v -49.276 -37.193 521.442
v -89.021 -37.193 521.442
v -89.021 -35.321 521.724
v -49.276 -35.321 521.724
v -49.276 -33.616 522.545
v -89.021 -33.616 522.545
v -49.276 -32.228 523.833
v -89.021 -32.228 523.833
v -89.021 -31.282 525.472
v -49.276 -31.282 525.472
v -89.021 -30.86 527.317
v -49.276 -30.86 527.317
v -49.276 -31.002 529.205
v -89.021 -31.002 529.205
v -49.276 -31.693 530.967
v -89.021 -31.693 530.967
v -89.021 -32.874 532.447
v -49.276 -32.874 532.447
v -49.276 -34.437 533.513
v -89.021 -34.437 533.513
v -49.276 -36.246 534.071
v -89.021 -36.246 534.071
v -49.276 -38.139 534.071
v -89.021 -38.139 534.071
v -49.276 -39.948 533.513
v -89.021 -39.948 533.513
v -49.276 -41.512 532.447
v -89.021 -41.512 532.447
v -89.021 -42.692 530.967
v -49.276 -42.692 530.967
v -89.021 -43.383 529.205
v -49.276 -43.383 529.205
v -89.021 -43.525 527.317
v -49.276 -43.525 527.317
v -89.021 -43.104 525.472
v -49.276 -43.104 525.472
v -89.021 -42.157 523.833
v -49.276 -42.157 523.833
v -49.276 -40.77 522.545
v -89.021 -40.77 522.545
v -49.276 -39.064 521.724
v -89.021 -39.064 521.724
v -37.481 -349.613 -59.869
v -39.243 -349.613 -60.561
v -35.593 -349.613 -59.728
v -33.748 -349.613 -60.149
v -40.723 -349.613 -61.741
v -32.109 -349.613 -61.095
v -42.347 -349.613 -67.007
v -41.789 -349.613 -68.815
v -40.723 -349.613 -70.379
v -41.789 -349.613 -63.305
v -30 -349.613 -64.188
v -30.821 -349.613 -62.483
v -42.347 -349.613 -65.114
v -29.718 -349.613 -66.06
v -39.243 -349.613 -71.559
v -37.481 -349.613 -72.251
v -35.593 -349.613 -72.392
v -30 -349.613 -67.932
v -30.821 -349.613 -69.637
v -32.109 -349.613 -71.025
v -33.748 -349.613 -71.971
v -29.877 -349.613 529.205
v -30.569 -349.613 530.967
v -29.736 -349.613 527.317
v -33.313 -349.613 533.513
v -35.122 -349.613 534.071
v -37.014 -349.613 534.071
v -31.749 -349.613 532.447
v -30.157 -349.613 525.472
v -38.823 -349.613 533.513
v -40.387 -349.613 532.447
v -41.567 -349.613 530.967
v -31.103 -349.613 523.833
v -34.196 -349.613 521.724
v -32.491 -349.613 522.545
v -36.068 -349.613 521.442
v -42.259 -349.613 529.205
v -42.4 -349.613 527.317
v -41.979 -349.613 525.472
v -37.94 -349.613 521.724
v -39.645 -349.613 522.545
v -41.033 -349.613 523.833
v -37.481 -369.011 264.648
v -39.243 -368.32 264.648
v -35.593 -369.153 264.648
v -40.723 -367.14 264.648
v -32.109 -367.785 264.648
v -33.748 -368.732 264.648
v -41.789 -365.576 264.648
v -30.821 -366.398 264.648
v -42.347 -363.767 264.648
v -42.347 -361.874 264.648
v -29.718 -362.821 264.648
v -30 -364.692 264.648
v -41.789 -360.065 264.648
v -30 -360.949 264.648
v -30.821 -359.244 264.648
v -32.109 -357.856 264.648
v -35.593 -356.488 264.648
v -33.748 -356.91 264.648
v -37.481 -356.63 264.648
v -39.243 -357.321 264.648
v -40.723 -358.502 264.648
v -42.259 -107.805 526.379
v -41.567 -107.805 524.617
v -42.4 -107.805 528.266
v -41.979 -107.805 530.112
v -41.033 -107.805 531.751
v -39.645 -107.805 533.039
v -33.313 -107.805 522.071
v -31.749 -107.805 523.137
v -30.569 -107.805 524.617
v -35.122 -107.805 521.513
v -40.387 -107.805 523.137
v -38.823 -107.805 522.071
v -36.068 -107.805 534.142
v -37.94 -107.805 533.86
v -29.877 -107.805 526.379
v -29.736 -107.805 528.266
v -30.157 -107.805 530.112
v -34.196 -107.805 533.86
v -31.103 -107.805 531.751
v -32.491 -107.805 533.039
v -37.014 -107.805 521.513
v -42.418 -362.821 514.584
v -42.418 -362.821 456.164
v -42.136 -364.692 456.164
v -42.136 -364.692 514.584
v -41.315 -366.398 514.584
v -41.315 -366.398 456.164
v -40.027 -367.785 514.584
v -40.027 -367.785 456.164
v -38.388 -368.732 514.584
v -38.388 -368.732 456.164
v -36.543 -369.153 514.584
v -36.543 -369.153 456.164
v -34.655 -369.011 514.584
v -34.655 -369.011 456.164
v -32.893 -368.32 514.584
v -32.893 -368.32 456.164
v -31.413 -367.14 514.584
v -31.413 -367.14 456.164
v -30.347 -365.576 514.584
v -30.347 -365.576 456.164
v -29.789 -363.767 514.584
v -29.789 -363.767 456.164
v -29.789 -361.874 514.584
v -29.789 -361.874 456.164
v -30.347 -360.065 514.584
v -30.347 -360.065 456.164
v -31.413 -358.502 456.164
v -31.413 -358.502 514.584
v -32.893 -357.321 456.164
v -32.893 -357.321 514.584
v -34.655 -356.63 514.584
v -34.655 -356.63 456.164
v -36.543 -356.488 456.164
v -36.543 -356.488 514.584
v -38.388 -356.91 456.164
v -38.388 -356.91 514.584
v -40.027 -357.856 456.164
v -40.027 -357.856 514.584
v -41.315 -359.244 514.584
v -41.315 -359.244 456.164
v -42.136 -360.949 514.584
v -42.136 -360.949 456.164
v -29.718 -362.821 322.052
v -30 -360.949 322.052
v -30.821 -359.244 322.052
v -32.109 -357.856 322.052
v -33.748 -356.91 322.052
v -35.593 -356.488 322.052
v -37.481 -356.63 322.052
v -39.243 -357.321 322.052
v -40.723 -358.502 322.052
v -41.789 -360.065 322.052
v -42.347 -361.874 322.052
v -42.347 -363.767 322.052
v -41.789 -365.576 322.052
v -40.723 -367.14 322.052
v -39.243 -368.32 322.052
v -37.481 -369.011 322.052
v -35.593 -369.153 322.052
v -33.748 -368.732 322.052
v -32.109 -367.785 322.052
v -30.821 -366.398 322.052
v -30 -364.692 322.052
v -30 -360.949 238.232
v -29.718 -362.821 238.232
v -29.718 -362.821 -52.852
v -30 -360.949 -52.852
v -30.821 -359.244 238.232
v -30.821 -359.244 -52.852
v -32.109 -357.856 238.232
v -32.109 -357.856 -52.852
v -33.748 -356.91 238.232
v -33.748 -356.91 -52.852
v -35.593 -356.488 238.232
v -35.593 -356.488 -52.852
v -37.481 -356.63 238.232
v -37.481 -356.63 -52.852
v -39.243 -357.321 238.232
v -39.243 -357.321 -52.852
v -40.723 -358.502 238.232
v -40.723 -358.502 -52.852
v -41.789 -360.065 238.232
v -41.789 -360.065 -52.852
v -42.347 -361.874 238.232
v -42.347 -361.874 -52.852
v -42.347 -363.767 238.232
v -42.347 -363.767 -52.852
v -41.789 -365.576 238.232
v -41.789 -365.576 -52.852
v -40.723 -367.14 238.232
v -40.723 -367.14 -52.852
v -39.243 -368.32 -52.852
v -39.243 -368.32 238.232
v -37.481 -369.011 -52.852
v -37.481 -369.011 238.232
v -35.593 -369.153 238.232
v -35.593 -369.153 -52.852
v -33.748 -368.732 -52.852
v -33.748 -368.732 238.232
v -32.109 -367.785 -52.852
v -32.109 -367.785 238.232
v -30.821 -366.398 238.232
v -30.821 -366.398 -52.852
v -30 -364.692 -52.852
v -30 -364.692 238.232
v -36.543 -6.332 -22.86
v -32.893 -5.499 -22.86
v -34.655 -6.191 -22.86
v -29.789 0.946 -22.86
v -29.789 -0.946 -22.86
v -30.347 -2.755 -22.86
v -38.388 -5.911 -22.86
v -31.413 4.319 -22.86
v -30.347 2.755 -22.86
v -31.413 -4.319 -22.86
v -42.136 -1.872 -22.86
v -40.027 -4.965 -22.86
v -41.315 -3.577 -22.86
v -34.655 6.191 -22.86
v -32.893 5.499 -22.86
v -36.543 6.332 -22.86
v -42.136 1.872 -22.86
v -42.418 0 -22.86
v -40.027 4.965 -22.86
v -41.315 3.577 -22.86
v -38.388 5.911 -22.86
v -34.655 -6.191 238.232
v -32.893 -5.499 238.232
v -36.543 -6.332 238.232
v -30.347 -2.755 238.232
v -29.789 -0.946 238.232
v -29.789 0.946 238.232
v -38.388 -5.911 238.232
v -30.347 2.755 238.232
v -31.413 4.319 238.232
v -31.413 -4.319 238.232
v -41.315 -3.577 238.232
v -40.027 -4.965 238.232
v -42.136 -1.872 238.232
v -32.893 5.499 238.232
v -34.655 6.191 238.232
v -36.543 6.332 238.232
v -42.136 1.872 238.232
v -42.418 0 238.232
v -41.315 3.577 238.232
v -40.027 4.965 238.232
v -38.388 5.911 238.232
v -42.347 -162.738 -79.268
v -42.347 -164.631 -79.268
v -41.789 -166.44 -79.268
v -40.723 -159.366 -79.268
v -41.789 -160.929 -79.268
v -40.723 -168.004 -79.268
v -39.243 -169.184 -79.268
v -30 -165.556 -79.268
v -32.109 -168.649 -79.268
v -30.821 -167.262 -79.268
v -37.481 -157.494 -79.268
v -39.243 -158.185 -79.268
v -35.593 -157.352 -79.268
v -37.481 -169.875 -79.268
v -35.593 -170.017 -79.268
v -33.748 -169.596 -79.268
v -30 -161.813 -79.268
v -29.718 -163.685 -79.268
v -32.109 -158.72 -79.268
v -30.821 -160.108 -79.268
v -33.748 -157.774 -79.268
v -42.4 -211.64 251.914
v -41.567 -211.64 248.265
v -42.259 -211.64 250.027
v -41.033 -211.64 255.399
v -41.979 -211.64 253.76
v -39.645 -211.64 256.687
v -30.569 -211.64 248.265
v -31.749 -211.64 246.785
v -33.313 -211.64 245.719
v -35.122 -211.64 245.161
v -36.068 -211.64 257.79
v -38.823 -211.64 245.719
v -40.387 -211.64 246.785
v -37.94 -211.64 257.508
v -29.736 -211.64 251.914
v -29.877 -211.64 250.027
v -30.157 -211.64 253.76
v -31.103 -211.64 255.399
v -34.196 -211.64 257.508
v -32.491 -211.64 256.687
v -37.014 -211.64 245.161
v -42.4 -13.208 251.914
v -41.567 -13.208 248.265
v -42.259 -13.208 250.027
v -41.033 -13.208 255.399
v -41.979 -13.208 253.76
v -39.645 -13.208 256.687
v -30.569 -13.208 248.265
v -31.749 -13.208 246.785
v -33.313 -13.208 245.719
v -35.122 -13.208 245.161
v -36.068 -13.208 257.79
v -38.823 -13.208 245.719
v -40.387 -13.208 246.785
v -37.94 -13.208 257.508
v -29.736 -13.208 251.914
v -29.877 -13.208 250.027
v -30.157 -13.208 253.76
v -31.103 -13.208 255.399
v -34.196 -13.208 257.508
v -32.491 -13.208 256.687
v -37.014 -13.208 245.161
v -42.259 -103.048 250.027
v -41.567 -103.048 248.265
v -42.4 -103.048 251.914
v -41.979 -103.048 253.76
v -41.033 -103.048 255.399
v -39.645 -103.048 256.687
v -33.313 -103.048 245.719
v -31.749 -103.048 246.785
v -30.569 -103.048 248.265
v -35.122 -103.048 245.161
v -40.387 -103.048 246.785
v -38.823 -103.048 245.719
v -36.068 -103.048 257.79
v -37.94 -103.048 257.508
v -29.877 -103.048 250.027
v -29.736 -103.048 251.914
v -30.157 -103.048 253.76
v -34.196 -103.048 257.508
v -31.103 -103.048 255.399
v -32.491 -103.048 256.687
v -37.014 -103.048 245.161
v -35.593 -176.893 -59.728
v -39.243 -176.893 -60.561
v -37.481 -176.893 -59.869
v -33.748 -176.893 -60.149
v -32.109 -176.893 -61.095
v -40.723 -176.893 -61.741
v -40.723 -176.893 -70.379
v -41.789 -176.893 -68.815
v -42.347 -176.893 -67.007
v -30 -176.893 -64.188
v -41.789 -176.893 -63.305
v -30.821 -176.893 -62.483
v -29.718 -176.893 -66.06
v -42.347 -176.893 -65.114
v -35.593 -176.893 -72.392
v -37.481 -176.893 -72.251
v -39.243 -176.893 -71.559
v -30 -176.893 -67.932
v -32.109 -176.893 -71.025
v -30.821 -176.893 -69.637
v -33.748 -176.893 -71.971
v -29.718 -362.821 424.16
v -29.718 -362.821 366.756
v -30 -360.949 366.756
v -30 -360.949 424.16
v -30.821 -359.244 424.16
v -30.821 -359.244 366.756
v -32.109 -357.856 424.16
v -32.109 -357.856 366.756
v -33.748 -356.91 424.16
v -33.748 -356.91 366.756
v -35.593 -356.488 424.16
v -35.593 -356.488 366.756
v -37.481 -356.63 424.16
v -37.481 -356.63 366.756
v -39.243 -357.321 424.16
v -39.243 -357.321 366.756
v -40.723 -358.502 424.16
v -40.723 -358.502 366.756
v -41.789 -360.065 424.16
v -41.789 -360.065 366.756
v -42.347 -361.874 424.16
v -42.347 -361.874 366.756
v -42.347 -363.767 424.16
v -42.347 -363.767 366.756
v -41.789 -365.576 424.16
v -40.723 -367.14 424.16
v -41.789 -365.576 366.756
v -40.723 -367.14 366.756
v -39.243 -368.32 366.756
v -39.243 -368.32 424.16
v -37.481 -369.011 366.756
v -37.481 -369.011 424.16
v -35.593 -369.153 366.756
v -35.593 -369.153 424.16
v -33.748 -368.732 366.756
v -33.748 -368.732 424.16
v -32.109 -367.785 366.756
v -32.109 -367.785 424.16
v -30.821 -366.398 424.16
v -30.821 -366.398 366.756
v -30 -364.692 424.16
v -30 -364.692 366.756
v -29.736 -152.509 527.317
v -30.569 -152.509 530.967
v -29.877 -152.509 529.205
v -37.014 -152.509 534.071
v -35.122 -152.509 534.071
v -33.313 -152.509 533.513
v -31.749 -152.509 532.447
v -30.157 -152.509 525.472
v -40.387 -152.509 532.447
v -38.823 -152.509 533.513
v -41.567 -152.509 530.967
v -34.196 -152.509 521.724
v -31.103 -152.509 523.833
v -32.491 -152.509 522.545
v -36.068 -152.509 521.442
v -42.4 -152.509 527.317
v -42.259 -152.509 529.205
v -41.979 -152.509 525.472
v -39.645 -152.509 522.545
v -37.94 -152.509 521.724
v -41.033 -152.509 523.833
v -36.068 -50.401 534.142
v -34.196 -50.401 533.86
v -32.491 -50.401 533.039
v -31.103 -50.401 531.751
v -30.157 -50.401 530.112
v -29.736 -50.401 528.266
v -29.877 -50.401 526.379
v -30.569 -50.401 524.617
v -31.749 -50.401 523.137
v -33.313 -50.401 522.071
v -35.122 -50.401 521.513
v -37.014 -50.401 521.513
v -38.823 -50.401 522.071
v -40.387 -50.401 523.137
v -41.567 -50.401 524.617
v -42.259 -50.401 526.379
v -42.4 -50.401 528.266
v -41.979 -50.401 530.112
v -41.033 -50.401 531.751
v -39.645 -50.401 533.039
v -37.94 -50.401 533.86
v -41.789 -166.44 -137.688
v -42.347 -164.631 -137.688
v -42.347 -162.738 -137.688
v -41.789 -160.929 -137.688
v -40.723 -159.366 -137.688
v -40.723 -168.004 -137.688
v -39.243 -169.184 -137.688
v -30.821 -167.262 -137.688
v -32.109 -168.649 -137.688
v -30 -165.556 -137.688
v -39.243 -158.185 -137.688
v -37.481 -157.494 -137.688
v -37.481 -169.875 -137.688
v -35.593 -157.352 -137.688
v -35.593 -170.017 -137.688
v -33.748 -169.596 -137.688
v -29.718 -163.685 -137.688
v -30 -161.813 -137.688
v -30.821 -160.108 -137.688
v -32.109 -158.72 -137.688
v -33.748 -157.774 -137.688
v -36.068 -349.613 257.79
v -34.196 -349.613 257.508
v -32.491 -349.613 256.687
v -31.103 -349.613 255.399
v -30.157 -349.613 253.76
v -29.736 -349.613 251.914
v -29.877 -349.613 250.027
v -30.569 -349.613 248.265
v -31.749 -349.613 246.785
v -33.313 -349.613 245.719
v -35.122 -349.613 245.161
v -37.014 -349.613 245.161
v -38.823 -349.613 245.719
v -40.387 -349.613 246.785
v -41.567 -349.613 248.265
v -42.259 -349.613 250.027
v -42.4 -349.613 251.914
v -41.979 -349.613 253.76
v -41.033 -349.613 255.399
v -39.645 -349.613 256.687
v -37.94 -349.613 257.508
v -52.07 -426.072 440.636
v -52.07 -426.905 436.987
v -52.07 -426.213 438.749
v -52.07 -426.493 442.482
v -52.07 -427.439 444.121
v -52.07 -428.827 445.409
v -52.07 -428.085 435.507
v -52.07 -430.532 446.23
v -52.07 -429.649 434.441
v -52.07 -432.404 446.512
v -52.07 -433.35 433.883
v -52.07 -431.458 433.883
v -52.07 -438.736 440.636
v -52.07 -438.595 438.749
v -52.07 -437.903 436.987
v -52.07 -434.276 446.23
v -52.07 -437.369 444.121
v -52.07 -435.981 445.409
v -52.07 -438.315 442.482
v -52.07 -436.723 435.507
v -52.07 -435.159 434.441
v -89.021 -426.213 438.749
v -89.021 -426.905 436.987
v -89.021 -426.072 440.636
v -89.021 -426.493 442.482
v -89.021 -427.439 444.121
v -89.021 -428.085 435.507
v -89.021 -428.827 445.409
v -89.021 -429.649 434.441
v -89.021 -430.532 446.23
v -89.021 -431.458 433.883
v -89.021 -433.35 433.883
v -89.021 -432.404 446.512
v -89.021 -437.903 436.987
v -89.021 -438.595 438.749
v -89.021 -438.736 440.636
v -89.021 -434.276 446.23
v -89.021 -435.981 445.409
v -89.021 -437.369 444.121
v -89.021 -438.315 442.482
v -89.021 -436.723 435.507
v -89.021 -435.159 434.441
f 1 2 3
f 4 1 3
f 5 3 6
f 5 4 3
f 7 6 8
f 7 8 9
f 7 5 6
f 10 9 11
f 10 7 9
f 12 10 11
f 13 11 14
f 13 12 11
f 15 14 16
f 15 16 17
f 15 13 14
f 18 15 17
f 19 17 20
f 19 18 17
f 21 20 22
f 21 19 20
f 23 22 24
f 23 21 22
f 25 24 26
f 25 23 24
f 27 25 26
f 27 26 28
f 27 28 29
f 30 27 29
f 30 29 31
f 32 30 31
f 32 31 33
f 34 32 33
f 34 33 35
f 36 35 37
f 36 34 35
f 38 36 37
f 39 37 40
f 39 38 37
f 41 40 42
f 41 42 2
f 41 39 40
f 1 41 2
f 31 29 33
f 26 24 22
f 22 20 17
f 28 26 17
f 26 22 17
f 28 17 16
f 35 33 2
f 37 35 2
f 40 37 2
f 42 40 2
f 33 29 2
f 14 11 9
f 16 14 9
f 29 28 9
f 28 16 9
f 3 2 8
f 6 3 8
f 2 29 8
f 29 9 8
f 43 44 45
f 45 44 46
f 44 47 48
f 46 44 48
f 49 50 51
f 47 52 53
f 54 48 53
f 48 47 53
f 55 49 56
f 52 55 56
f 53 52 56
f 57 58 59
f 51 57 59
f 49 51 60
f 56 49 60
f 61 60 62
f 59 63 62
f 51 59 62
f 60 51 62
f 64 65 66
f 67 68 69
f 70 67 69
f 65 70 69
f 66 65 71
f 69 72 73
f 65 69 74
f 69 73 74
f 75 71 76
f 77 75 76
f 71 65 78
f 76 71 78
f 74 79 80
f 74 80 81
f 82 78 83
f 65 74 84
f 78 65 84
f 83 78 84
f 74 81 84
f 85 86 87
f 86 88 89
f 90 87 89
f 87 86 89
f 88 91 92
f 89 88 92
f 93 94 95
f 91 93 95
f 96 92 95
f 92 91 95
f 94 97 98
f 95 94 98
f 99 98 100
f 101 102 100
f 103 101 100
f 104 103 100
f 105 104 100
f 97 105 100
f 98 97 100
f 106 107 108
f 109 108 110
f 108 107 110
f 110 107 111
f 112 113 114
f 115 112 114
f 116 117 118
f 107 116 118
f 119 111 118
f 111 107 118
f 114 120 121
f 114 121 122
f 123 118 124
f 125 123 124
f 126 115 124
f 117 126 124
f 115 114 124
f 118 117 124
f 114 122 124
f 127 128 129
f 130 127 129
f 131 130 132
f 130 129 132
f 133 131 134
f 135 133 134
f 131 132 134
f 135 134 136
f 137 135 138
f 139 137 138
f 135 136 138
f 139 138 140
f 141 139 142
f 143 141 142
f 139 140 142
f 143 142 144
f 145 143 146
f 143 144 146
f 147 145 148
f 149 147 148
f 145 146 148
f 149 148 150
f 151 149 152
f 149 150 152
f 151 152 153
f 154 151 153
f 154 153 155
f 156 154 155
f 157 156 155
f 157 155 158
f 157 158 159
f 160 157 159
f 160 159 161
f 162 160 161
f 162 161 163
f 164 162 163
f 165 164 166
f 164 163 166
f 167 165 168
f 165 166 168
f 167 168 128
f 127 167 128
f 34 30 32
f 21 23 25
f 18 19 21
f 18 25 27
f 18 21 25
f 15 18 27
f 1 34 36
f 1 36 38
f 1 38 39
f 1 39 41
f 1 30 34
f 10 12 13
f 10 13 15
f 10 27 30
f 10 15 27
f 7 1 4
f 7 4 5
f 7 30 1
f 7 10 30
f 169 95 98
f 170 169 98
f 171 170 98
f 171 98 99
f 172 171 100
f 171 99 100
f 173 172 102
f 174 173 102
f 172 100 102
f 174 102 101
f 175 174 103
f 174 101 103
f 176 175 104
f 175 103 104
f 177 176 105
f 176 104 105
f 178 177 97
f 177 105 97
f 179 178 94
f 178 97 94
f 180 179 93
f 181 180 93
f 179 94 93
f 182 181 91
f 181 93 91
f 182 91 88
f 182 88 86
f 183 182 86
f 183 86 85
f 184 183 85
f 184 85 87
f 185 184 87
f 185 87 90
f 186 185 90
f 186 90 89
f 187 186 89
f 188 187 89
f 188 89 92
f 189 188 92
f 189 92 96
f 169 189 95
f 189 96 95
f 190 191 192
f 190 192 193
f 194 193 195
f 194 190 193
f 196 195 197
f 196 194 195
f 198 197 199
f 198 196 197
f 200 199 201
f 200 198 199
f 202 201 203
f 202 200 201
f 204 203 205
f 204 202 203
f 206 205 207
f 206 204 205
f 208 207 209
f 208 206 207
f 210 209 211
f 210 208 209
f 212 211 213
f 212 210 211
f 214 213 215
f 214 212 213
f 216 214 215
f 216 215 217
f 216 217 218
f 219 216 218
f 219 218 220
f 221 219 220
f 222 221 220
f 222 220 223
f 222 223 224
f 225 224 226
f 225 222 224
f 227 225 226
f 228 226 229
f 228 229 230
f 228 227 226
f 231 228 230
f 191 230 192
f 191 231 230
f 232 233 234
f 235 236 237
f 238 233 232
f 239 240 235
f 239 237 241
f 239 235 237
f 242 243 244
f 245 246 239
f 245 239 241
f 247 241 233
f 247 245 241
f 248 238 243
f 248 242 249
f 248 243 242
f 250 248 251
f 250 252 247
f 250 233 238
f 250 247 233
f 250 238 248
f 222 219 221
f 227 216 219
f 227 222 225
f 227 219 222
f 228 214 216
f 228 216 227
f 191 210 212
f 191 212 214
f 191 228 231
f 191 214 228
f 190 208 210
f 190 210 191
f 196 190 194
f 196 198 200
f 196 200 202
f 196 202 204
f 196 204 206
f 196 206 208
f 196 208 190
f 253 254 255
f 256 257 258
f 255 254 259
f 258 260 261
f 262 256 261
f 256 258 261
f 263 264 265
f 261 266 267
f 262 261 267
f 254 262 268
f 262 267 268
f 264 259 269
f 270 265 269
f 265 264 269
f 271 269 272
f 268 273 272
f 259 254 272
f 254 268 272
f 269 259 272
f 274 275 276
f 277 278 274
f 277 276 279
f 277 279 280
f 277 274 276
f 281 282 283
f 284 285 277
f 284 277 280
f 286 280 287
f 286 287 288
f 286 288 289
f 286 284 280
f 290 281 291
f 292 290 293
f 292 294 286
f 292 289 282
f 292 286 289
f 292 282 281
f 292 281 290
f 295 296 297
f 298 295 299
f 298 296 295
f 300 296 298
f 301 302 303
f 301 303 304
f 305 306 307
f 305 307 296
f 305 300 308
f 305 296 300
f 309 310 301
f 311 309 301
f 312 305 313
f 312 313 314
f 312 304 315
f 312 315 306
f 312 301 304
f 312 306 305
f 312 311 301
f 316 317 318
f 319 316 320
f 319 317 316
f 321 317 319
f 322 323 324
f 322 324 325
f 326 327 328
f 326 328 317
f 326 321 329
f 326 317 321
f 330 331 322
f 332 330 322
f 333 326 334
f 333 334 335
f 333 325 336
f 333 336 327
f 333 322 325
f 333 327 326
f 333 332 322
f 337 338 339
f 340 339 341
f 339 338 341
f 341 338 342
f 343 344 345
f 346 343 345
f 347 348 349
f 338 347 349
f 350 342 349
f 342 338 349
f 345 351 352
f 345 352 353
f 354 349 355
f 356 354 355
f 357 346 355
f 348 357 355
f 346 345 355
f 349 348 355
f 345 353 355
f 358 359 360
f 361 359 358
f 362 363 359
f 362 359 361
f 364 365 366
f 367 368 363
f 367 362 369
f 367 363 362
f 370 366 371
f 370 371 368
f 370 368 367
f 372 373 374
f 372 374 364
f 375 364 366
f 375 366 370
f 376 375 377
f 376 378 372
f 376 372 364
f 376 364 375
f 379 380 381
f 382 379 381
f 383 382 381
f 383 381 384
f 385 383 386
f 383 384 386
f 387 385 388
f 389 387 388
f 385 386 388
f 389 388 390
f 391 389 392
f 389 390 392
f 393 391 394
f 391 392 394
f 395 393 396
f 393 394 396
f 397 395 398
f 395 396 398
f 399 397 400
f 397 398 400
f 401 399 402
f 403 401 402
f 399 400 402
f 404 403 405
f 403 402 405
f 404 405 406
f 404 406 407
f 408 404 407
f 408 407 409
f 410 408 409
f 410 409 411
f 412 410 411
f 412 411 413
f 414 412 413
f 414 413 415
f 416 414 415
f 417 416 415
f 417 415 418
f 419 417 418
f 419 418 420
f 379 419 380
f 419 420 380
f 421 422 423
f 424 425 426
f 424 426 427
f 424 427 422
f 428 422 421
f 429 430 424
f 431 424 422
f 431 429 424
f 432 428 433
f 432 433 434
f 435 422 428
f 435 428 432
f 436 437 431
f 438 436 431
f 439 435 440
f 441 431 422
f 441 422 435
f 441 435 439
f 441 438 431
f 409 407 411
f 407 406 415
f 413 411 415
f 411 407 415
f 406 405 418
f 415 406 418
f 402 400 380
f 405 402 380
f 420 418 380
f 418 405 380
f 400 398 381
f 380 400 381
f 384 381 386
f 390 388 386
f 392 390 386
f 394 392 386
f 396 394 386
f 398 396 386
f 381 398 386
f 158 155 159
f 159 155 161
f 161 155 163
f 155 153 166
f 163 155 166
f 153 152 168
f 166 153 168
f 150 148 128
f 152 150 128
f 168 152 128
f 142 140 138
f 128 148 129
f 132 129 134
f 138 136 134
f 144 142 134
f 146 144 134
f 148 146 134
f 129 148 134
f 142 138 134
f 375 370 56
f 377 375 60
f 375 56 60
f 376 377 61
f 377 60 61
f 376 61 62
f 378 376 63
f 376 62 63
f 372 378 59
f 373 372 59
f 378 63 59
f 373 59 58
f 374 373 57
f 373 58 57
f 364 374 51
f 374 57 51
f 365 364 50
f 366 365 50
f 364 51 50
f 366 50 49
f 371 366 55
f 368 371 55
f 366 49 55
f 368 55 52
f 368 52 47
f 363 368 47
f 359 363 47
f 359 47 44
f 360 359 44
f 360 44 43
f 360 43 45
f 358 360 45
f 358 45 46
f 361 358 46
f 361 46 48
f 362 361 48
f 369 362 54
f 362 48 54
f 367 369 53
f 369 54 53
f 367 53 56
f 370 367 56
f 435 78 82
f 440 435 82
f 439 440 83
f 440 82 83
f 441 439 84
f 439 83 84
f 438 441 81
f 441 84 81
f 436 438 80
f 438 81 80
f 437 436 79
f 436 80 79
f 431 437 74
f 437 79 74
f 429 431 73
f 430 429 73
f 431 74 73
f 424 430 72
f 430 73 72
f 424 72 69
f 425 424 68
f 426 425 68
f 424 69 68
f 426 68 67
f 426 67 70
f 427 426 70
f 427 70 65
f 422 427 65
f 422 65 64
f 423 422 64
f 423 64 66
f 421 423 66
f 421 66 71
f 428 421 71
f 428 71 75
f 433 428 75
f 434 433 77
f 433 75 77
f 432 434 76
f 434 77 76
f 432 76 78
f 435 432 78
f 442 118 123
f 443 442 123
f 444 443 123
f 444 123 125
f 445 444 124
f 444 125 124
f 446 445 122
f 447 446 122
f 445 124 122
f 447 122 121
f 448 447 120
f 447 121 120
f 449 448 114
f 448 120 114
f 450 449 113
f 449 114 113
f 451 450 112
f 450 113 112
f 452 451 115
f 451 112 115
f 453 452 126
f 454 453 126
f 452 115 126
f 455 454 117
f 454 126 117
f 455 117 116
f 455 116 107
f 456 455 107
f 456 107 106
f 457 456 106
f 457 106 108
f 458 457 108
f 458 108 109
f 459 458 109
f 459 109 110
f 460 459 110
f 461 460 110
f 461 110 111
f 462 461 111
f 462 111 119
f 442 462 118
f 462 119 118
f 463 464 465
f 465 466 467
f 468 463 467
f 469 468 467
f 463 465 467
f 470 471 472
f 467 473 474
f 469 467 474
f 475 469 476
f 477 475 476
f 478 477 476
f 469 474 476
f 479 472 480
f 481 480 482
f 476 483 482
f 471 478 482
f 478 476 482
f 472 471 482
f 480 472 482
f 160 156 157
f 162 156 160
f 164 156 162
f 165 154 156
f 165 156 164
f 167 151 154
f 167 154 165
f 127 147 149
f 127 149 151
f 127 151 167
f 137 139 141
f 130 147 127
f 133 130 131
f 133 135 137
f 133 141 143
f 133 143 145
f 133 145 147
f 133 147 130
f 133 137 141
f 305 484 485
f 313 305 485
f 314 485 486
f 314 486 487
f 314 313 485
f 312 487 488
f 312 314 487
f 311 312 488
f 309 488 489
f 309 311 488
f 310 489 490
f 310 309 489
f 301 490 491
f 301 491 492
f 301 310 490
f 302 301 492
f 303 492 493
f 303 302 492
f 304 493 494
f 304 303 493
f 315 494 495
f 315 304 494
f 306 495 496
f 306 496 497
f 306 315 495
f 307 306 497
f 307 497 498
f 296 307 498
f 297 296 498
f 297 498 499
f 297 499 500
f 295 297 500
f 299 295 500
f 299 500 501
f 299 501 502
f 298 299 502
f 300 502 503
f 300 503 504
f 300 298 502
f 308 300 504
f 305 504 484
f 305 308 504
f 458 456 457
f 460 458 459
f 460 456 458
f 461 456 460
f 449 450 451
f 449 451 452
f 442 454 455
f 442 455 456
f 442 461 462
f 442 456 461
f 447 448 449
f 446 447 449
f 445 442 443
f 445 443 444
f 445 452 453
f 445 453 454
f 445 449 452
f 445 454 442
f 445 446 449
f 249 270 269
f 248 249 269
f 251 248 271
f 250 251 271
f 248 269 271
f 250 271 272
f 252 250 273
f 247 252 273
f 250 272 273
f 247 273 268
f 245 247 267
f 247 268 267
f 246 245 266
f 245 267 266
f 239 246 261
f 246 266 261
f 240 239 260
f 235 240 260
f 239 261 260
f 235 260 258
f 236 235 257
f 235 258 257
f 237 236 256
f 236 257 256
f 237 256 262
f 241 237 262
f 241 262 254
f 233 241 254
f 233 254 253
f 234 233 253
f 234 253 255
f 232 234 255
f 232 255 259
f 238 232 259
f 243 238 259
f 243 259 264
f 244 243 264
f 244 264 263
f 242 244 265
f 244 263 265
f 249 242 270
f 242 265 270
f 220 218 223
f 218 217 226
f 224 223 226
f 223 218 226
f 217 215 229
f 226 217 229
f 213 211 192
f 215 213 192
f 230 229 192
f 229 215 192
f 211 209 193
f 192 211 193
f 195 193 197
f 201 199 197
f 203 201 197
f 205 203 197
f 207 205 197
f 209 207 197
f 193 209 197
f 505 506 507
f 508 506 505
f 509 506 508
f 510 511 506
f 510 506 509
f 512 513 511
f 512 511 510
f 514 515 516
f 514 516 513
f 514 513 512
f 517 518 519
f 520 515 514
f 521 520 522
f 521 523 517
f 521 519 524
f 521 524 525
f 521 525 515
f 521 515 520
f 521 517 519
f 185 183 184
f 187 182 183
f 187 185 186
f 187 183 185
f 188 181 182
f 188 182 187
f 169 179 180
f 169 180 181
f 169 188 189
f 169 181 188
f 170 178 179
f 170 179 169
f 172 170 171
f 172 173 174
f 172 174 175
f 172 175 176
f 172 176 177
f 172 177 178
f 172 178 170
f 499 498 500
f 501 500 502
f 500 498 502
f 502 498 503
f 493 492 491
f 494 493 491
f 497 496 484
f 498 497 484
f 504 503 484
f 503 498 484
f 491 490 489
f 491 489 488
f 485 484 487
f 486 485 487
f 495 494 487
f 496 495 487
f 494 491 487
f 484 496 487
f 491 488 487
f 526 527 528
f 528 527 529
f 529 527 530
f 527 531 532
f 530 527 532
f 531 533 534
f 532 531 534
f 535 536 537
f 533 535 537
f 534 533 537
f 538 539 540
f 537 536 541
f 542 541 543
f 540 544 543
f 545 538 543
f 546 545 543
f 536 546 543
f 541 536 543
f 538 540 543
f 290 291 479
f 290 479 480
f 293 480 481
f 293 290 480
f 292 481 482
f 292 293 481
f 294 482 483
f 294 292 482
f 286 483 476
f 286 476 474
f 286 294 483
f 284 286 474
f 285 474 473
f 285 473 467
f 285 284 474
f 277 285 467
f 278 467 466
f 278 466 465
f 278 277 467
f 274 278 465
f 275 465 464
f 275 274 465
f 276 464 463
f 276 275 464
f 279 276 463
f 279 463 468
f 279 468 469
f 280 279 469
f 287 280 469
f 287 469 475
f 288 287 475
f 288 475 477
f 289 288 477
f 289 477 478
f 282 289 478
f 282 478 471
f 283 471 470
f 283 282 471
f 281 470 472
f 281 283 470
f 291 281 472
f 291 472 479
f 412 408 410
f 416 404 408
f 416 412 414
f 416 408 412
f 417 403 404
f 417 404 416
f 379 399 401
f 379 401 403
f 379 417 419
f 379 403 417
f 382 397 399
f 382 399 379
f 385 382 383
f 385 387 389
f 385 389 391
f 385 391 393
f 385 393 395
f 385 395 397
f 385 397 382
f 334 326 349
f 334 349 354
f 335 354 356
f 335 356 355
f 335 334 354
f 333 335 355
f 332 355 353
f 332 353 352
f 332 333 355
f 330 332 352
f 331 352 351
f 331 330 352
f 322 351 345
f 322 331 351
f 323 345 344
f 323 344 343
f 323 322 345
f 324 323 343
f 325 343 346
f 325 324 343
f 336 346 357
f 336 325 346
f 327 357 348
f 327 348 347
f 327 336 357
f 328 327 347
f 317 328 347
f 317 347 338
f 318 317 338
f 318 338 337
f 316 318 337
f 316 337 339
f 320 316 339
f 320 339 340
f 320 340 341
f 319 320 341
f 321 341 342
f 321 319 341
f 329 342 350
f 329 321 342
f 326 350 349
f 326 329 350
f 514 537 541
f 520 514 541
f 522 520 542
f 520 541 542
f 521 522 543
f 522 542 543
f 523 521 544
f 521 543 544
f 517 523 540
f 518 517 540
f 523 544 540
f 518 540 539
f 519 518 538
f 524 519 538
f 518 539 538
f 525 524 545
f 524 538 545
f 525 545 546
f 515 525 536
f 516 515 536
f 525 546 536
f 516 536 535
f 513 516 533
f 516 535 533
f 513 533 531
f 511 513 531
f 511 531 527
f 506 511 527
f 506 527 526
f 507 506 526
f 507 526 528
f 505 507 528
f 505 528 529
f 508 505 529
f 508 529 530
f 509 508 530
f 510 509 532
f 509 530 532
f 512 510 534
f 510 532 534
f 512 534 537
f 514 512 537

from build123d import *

# Parameters (mm, degrees)
BOSS_EXTRUDE1_START     = -261.091901869
BOSS_EXTRUDE1_OUTLINE_R = 6.35
BOSS_EXTRUDE1_DEPTH     = 261.091901869
SKETCH3_R               = 6.35
BOSS_EXTRUDE2_DEPTH     = 89.839846195
SKETCH4_R               = 6.35
BOSS_EXTRUDE3_DEPTH     = 137.9728
SKETCH5_R               = 6.35
BOSS_EXTRUDE4_DEPTH     = 291.084
SKETCH6_R               = 6.35
BOSS_EXTRUDE5_DEPTH     = 172.720000001
SKETCH7_R               = 6.35
BOSS_EXTRUDE6_DEPTH     = 58.42
SKETCH8_R               = 6.35
BOSS_EXTRUDE7_DEPTH     = 57.404
SKETCH9_R               = 6.35
BOSS_EXTRUDE8_DEPTH     = 57.404
SKETCH10_R              = 6.35
BOSS_EXTRUDE9_DEPTH     = 36.950997131
SKETCH11_R              = 6.35
BOSS_EXTRUDE10_DEPTH    = 58.42
SKETCH12_R              = 6.35
BOSS_EXTRUDE11_DEPTH    = 197.104
SKETCH13_R              = 6.35
BOSS_EXTRUDE12_DEPTH    = 57.404
SKETCH14_R              = 6.35
BOSS_EXTRUDE13_DEPTH    = 39.744997131


# Read off the part's stored shape, not the designer's step: Boss-Extrude1
with BuildPart() as part:
    # Boss-Extrude1 outline → Boss-Extrude1 (new body)
    with BuildSketch(Plane(origin=(0, 0, -22.86), x_dir=(-1, 0, 0), z_dir=(0, 0, -1)).offset(BOSS_EXTRUDE1_START)):
        with Locations((36.068, 0)):
            Circle(BOSS_EXTRUDE1_OUTLINE_R)
    extrude(amount=BOSS_EXTRUDE1_DEPTH)


with BuildPart() as body_2:
    # Sketch3 → Boss-Extrude2 (new body)
    with BuildSketch(Plane(origin=(0, -13.208, 0), x_dir=(1, 0, 0), z_dir=(0, 1, 0))):
        with Locations(Location((-36.068, -251.439901869, 0), (0, 0, 270))):
            Circle(SKETCH3_R)
    extrude(amount=-BOSS_EXTRUDE2_DEPTH)


with BuildPart() as body_3:
    # Sketch4 → Boss-Extrude3 (new body)
    with BuildSketch(Plane(origin=(0, -211.639846435, 0), x_dir=(1, 0, 0), z_dir=(0, 1, 0))):
        with Locations(Location((-36.068, -251.439901869, 0), (0, 0, 270))):
            Circle(SKETCH4_R)
    extrude(amount=-BOSS_EXTRUDE3_DEPTH)


with BuildPart() as body_4:
    # Sketch5 → Boss-Extrude4 (new body)
    with BuildSketch(Plane.XY.offset(238.231901869)):
        with Locations((-36.068, -362.820646437)):
            Circle(SKETCH5_R)
    extrude(amount=-BOSS_EXTRUDE4_DEPTH)


with BuildPart() as body_5:
    # Sketch6 → Boss-Extrude5 (new body)
    with BuildSketch(Plane(origin=(0, -349.612646437, 0), x_dir=(1, 0, 0), z_dir=(0, 1, 0))):
        with Locations((-36.068, 66.060098131)):
            Circle(SKETCH6_R)
    extrude(amount=BOSS_EXTRUDE5_DEPTH)


with BuildPart() as body_6:
    # Sketch7 → Boss-Extrude6 (new body)
    with BuildSketch(Plane.XY.offset(-79.268098131)):
        with Locations((-36.068, -163.684646435)):
            Circle(SKETCH7_R)
    extrude(amount=-BOSS_EXTRUDE6_DEPTH)


with BuildPart() as body_7:
    # Sketch8 → Boss-Extrude7 (new body)
    with BuildSketch(Plane.XY.offset(264.647901869)):
        with Locations((-36.068, -362.820646435)):
            Circle(SKETCH8_R)
    extrude(amount=BOSS_EXTRUDE7_DEPTH)


with BuildPart() as body_8:
    # Sketch9 → Boss-Extrude8 (new body)
    with BuildSketch(Plane.XY.offset(366.755901869)):
        with Locations((-36.068, -362.820646437)):
            Circle(SKETCH9_R)
    extrude(amount=BOSS_EXTRUDE8_DEPTH)


with BuildPart() as body_9:
    # Sketch10 → Boss-Extrude9 (new body)
    with BuildSketch(Plane(origin=(-89.020997131, 0, 0), x_dir=(0, 0, -1), z_dir=(1, 0, 0))):
        with Locations(Location((-440.161901869, -432.403946437, 0), (0, 0, 180))):
            Circle(SKETCH10_R)
    extrude(amount=BOSS_EXTRUDE9_DEPTH)


with BuildPart() as body_10:
    # Sketch11 → Boss-Extrude10 (new body)
    with BuildSketch(Plane.XY.offset(456.163901869)):
        with Locations(Location((-36.068, -362.820646437, 0), (0, 0, 180))):
            Circle(SKETCH11_R)
    extrude(amount=BOSS_EXTRUDE10_DEPTH)


with BuildPart() as body_11:
    # Sketch12 → Boss-Extrude11 (new body)
    with BuildSketch(Plane(origin=(0, -349.612646437, 0), x_dir=(1, 0, 0), z_dir=(0, 1, 0))):
        with Locations(Location((-36.068, -527.791901869, 0), (0, 0, 90))):
            Circle(SKETCH12_R)
    extrude(amount=BOSS_EXTRUDE11_DEPTH)


with BuildPart() as body_12:
    # Sketch13 → Boss-Extrude12 (new body)
    with BuildSketch(Plane(origin=(0, -107.804646437, 0), x_dir=(1, 0, 0), z_dir=(0, 1, 0))):
        with Locations(Location((-36.068, -527.791901869, 0), (0, 0, 270))):
            Circle(SKETCH13_R)
    extrude(amount=BOSS_EXTRUDE12_DEPTH)


with BuildPart() as body_13:
    # Sketch14 → Boss-Extrude13 (new body)
    with BuildSketch(Plane(origin=(-49.276, 0, 0), x_dir=(0, 0, -1), z_dir=(1, 0, 0))):
        with Locations((-527.791901869, -37.192646437)):
            Circle(SKETCH14_R)
    extrude(amount=-BOSS_EXTRUDE13_DEPTH)


solid = Compound([part.part, body_2.part, body_3.part, body_4.part, body_5.part, body_6.part, body_7.part, body_8.part, body_9.part, body_10.part, body_11.part, body_12.part, body_13.part])
